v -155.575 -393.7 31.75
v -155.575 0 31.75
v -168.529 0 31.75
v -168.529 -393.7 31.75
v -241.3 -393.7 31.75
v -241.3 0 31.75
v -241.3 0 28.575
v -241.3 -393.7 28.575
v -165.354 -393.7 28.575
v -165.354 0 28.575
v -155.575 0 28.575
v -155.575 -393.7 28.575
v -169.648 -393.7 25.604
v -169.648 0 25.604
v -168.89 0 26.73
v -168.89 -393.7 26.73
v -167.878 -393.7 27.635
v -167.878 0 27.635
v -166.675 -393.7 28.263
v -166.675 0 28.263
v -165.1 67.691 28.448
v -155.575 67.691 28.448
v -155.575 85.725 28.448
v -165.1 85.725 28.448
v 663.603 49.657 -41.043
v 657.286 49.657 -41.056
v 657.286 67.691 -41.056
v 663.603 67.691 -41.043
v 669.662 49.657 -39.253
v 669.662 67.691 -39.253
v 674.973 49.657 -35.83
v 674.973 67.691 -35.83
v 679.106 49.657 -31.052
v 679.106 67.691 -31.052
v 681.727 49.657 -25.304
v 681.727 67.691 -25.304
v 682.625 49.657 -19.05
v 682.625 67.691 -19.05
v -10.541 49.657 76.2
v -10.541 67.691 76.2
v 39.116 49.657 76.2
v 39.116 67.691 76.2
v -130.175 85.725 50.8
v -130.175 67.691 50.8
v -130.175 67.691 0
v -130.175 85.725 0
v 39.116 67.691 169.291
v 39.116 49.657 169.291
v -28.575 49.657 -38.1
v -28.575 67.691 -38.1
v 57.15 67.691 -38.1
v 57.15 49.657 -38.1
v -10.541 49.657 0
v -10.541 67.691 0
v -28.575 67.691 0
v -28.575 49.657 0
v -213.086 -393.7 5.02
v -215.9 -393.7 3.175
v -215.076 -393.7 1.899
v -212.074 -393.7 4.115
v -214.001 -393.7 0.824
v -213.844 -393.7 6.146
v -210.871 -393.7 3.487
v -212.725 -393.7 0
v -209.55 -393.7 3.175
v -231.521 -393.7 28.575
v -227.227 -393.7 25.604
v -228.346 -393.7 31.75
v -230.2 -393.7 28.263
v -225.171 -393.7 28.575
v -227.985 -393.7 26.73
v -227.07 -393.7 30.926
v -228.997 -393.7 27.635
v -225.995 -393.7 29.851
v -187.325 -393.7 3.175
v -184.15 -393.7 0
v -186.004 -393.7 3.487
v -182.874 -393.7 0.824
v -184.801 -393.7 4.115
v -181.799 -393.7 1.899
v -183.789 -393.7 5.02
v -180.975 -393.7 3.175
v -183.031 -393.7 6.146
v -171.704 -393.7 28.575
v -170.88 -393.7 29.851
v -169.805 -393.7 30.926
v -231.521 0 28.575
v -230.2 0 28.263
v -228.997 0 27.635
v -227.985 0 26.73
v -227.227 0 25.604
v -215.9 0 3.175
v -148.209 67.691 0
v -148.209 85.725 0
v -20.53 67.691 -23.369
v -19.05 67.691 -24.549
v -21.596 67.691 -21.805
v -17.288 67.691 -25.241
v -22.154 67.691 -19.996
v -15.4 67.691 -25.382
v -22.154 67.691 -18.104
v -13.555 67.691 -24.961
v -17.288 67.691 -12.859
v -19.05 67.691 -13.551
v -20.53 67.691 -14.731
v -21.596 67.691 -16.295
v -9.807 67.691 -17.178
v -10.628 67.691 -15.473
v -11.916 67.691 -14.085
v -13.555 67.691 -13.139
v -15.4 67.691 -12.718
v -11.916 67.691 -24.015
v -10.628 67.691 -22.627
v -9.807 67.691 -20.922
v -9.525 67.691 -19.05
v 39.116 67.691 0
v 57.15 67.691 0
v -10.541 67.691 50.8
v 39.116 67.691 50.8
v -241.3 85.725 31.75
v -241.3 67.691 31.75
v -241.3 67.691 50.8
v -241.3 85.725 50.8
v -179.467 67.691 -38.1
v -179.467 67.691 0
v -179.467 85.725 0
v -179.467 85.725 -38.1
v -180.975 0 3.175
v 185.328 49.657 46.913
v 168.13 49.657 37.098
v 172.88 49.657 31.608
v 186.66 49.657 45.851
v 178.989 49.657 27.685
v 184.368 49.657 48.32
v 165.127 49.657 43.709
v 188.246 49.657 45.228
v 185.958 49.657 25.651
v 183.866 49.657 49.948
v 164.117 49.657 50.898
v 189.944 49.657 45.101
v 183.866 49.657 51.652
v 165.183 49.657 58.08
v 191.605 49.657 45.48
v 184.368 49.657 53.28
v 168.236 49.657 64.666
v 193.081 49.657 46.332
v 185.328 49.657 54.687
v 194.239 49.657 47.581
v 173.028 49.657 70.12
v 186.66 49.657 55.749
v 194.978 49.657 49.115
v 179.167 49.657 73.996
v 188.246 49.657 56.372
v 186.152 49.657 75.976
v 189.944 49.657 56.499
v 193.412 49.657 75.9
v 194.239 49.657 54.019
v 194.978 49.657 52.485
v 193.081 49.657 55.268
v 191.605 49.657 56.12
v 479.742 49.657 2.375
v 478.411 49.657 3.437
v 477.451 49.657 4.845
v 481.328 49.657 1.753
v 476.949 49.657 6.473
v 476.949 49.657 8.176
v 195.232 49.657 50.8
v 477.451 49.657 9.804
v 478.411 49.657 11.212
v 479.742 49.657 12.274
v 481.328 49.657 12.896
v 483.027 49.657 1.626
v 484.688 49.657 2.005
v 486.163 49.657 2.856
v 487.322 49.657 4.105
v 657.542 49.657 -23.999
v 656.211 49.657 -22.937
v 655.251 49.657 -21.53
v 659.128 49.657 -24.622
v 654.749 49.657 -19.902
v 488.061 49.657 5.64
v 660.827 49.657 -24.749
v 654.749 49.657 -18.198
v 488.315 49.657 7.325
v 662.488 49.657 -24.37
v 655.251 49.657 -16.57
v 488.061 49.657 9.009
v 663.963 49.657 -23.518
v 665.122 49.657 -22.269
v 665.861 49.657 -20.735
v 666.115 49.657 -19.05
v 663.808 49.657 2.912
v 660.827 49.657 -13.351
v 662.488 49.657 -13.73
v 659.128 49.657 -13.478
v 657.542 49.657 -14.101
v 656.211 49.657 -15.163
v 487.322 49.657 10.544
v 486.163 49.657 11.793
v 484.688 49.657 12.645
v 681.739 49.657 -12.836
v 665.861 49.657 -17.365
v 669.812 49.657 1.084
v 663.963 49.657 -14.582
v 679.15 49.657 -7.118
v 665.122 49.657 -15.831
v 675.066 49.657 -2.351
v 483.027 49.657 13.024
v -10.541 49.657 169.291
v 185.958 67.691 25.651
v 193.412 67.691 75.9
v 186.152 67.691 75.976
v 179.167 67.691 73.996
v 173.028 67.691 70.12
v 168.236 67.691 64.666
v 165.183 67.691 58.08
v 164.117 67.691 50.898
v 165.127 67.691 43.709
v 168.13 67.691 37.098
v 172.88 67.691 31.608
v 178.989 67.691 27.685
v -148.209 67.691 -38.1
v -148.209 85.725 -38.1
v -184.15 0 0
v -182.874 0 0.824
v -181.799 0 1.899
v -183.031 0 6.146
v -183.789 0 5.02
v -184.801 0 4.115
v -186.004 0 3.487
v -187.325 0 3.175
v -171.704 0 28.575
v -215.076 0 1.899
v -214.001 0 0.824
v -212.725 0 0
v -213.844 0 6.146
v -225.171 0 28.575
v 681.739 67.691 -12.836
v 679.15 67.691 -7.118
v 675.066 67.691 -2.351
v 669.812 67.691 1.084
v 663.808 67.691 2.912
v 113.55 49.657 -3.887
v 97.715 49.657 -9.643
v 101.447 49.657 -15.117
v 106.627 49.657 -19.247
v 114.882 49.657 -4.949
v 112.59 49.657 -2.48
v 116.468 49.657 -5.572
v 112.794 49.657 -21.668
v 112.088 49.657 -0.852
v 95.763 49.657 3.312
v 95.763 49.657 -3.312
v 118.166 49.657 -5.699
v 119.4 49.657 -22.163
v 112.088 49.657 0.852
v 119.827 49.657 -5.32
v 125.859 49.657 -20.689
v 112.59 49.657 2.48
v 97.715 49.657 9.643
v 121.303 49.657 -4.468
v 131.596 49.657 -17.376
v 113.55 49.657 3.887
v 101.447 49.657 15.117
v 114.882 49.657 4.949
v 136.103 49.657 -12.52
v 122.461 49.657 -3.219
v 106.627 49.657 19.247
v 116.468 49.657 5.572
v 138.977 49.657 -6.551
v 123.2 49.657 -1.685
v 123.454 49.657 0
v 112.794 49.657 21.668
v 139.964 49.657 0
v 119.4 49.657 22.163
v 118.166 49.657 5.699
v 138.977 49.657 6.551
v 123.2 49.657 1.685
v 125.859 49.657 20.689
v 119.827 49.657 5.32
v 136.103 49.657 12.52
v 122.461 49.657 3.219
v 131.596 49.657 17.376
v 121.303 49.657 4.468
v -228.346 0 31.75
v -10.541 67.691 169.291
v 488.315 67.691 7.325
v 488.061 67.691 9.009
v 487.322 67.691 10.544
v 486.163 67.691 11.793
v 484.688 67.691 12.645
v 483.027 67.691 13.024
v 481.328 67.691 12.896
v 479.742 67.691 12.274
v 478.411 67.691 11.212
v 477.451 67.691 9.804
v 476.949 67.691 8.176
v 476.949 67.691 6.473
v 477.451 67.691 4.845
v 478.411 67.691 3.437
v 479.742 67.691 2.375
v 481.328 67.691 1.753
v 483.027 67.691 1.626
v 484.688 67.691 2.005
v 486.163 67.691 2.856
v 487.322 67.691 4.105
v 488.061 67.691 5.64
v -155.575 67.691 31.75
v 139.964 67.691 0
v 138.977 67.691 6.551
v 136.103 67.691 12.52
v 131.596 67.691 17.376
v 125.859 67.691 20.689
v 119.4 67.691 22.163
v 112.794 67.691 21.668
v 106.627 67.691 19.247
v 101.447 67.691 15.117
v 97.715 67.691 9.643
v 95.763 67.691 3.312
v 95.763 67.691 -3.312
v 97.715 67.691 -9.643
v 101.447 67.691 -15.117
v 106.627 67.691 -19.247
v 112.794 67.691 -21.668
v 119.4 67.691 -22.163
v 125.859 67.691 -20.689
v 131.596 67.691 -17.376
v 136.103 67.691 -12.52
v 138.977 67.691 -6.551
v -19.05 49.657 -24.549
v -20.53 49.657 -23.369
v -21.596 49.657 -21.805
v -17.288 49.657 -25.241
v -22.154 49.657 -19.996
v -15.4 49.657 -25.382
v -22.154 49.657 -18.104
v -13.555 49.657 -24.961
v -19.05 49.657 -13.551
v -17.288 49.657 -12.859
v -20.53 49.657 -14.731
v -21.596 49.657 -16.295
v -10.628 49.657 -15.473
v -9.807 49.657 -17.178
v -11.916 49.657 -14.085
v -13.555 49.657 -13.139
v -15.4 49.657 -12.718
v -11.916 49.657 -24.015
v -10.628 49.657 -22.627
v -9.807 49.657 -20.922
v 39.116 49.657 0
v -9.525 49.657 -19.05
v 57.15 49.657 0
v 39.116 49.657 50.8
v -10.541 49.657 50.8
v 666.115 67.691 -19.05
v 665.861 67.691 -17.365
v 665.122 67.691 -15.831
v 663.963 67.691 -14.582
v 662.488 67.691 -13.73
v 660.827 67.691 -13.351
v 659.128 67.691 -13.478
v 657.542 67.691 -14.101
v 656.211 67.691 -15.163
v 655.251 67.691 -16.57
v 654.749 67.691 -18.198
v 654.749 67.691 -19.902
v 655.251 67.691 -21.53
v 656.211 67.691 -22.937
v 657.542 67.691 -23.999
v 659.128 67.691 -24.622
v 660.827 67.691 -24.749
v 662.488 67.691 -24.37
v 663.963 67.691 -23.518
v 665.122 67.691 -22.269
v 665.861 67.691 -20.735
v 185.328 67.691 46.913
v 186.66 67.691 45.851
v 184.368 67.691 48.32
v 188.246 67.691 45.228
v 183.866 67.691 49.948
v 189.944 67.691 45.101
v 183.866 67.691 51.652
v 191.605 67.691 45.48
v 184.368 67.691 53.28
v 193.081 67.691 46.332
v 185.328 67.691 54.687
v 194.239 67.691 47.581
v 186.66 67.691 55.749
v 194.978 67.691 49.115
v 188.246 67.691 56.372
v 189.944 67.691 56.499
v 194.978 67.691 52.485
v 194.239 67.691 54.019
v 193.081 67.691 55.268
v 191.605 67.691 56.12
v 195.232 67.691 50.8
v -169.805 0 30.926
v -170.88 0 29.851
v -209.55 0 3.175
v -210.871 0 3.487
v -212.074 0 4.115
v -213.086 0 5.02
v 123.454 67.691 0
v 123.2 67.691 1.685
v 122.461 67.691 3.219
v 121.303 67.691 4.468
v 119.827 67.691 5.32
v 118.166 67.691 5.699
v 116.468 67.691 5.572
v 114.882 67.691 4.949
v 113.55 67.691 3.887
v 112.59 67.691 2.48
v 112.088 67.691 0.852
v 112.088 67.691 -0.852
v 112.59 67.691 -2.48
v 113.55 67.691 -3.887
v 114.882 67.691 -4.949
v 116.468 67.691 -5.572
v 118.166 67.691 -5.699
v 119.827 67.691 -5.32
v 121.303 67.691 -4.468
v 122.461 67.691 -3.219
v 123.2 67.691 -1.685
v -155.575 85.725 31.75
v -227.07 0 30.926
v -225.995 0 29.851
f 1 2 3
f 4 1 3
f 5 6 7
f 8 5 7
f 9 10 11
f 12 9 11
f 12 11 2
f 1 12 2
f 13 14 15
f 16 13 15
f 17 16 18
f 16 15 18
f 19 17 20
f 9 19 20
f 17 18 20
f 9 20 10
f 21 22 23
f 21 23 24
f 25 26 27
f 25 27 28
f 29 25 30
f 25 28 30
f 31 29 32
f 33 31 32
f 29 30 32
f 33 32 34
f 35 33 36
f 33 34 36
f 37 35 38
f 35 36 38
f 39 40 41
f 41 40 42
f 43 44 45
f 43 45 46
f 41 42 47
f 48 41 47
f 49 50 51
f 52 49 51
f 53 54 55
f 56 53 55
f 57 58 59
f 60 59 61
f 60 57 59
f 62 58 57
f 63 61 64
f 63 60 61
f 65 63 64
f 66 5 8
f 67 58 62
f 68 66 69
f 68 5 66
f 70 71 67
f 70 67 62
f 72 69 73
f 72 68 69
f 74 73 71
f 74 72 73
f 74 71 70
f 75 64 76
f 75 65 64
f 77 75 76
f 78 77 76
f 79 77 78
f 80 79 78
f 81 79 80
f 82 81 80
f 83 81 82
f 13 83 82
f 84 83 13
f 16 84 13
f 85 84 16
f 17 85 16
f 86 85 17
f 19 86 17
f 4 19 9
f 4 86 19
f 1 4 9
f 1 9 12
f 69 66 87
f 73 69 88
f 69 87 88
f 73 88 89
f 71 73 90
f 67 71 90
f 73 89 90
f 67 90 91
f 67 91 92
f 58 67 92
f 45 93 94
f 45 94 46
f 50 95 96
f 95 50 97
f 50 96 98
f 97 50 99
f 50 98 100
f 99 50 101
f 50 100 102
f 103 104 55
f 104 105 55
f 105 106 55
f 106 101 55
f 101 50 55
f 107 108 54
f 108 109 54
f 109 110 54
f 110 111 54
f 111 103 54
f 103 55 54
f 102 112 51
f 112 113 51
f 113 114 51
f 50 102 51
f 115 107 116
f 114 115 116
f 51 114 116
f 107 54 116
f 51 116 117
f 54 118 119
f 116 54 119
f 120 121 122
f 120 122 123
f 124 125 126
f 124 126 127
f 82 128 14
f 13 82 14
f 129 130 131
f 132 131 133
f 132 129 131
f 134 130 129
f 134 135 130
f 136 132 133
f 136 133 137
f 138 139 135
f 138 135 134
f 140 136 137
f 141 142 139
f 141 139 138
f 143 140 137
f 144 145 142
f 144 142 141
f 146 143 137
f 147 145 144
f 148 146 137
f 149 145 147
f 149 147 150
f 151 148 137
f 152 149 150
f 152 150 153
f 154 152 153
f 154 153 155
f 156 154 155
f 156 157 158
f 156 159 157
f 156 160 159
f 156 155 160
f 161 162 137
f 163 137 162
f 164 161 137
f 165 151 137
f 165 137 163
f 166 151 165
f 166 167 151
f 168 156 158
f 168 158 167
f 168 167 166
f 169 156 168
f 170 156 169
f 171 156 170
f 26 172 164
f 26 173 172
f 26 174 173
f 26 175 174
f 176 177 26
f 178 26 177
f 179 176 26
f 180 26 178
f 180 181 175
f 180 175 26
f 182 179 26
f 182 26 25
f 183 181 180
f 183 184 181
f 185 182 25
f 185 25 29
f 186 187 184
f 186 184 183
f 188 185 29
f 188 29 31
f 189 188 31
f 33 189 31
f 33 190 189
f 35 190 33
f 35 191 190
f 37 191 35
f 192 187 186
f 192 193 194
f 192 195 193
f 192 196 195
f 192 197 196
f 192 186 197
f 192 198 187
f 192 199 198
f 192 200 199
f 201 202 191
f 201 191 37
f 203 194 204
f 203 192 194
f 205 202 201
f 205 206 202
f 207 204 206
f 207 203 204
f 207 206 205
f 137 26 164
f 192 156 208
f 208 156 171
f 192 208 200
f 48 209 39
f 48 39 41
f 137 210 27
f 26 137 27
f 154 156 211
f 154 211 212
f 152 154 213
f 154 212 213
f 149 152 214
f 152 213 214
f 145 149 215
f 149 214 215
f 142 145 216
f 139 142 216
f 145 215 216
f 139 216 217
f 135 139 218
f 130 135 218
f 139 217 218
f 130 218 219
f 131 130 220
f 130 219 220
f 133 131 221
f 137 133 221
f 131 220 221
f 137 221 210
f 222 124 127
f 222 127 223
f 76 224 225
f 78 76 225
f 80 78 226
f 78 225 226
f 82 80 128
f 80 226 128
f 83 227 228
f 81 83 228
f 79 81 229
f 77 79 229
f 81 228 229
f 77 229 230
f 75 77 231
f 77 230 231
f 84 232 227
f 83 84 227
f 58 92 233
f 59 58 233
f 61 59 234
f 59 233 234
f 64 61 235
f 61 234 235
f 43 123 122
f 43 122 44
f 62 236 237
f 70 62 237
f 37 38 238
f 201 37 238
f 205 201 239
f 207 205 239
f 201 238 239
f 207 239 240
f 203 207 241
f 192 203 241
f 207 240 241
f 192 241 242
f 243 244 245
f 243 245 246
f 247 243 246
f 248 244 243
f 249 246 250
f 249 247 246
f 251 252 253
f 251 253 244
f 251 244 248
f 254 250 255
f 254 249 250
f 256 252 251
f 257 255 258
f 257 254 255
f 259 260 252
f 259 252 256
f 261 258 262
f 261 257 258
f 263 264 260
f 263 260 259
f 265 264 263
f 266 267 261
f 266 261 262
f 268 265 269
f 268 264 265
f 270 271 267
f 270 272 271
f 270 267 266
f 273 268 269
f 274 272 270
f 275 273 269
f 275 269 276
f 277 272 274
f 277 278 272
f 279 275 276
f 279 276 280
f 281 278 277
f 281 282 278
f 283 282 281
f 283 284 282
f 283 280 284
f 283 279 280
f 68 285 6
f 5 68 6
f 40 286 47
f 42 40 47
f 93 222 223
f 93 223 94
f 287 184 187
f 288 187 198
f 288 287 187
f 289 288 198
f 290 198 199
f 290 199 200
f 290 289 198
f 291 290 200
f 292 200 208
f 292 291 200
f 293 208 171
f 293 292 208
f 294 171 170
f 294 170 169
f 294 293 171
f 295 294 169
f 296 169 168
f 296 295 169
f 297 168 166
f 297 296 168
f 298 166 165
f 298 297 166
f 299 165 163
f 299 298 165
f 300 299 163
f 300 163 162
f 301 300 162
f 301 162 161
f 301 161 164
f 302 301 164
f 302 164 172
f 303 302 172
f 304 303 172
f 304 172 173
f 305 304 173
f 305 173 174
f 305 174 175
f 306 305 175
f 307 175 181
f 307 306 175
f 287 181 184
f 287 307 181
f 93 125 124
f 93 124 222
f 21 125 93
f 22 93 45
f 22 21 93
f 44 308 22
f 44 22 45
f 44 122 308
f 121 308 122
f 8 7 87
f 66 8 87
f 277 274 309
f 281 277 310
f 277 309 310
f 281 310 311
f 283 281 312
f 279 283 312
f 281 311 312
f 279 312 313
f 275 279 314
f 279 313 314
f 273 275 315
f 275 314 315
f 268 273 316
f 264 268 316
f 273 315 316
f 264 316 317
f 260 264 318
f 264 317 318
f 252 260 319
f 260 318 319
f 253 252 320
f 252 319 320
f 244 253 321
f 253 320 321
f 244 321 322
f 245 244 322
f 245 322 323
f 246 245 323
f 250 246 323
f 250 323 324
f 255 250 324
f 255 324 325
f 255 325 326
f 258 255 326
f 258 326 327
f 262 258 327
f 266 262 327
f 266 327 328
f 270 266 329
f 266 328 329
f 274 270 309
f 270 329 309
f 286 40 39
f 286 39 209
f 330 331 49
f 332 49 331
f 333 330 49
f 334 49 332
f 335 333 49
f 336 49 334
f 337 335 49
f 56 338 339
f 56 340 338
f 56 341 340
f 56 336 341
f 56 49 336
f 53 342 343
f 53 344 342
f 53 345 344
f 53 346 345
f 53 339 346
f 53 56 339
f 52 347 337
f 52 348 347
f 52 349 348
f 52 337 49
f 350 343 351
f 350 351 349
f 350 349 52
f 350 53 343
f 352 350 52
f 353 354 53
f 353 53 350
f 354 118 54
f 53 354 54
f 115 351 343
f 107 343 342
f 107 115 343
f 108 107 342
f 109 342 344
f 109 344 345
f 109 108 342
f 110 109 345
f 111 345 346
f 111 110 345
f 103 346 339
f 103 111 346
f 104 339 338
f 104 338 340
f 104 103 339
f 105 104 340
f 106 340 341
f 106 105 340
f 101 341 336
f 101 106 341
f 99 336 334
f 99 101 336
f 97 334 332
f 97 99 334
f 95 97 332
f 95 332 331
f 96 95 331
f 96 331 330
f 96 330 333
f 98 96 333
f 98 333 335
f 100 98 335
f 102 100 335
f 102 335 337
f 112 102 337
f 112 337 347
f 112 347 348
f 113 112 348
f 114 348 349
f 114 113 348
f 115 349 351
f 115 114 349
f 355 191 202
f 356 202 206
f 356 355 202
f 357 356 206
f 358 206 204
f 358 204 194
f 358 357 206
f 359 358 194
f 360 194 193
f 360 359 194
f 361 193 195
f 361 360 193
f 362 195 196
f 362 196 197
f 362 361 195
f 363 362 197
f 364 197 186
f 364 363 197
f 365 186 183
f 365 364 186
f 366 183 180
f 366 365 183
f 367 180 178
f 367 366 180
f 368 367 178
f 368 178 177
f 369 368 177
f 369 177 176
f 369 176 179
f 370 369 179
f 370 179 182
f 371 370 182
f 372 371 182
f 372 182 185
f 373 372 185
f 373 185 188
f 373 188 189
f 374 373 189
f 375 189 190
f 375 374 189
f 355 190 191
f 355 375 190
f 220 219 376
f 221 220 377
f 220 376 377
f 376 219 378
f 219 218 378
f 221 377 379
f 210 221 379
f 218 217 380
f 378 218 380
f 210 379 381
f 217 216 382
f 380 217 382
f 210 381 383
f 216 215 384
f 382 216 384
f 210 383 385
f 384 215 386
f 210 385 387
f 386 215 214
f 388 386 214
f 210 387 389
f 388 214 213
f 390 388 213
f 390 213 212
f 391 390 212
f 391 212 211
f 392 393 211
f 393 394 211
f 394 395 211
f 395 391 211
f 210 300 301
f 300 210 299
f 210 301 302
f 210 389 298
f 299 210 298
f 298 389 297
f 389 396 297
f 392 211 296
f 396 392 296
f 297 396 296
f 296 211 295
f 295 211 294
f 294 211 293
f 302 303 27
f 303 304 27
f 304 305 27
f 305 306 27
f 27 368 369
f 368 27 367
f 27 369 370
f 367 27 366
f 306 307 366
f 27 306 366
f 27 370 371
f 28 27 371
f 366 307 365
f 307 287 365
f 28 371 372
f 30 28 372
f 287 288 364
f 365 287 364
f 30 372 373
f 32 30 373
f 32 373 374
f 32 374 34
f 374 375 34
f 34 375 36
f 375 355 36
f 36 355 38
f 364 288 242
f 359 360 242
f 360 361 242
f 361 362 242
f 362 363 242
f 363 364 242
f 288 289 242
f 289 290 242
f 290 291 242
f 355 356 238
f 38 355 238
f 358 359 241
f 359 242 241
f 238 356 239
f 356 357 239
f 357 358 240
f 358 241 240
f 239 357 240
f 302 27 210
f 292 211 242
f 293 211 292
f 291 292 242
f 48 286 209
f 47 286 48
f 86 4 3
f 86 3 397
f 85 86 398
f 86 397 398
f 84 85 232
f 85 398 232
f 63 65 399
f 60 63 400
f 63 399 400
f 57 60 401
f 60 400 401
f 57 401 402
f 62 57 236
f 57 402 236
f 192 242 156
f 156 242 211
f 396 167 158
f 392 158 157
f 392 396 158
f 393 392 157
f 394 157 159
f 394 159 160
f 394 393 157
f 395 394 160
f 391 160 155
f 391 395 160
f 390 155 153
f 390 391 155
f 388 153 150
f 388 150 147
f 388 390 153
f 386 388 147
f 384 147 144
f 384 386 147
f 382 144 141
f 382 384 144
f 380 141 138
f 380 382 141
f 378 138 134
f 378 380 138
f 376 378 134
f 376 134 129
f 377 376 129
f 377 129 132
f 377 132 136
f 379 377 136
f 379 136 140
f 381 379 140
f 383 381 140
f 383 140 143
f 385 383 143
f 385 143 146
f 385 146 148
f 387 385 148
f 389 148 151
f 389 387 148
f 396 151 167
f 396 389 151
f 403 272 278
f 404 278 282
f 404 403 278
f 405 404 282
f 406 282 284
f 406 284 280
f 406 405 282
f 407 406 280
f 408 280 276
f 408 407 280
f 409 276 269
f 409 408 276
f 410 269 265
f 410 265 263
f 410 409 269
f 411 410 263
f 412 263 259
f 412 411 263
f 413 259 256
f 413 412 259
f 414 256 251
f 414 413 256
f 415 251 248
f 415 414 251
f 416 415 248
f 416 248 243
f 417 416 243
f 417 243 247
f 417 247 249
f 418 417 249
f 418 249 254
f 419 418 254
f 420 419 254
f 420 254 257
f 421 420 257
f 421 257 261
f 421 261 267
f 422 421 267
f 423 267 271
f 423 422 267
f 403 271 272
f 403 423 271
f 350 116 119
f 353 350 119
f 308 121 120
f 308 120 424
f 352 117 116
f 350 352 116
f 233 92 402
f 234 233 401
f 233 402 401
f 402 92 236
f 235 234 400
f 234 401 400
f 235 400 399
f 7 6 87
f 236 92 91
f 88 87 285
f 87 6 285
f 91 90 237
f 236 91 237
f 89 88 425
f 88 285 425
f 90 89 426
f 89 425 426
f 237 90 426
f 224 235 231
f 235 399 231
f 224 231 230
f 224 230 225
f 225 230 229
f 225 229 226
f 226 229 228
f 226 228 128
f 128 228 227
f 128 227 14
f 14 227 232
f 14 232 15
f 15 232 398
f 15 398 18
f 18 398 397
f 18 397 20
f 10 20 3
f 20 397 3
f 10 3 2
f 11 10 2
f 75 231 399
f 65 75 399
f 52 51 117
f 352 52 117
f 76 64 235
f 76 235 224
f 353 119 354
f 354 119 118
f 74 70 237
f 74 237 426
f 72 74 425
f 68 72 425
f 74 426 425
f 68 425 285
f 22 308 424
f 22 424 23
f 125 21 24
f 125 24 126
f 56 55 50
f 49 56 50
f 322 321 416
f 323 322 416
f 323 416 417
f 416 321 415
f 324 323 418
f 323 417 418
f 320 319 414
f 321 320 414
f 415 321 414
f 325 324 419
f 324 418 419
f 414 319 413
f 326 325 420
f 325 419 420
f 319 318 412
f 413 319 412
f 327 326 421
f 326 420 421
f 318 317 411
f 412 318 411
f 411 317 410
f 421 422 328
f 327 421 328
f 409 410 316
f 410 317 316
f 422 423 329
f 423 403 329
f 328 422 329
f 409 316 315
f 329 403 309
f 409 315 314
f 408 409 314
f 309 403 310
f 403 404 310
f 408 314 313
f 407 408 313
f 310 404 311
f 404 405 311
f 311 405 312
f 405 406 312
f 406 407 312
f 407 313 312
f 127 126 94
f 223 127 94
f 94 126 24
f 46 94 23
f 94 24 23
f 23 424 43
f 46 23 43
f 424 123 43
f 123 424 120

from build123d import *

# Parameters (mm, degrees)
F0_W          = 12.954
F0_H          = 85.725
F0_W_2        = 5.334
F0_H_2        = 9.525
F0_W_3        = 15.621
F0_W_4        = 28.575
F1_DEPTH      = 31.75
F3_DEPTH      = 85.726
F4_W          = 111.125
F4_H          = 18.034
F5_DEPTH      = 50.8
F5_DEPTH_BACK = 38.1
F7_DEPTH      = 18.034
F6_R          = 6.35
F8_DEPTH      = 18.034
F6_W          = 49.657
F6_H          = 93.091
F6_R_2        = 5.715
F6_R_3        = 22.225
F9_DEPTH      = 393.7


with BuildPart() as f1:
    # F0 (on Top) → F1 (new body)
    with BuildSketch(Plane.XY):
        with Locations((-234.823, 42.8625)):
            Rectangle(F0_W, F0_H)
        with Locations((-233.8705, 47.625)):
            Rectangle(F0_W_2, F0_H_2, mode=Mode.SUBTRACT)
        with Locations((-220.5355, 42.8625)):
            Rectangle(F0_W_3, F0_H)
        with Locations((-198.4375, 42.8625)):
            Rectangle(F0_W_4, F0_H)
        with Locations((-169.8625, 42.8625)):
            Rectangle(F0_W_4, F0_H)
        with Locations((-163.0045, 47.625)):
            Rectangle(F0_W_2, F0_H_2, mode=Mode.SUBTRACT)
    extrude(amount=F1_DEPTH)

    # F2 (on face) → F3 (intersect, through all)
    with BuildSketch(Plane.XZ):
        Polygon((-241.3, 31.75), (-241.3, 28.575), (-231.521, 28.575), (-228.346, 28.575), (-228.346, 31.75), align=None)
        with BuildLine():
            Line((-228.346, 31.75), (-228.346, 28.575))
            Line((-228.346, 28.575), (-225.171, 28.575))
            ThreePointArc((-225.171, 28.575), (-226.5041592272, 30.4168407728), (-228.346, 31.75))
        make_face()
        with BuildLine():
            Line((-227.2272822536, 25.603620589), (-215.9, 3.175))
            Line((-215.9, 3.175), (-212.725, 3.175))
            Line((-212.725, 3.175), (-209.55, 3.175))
            ThreePointArc((-209.55, 3.175), (-212.0744542312, 4.1150549462), (-213.8437177464, 6.146379411))
            Line((-213.8437177464, 6.146379411), (-225.171, 28.575))
            Line((-225.171, 28.575), (-228.346, 28.575))
            Line((-228.346, 28.575), (-231.521, 28.575))
            ThreePointArc((-231.521, 28.575), (-228.9965457688, 27.6349450538), (-227.2272822536, 25.603620589))
        make_face()
        Polygon((-209.55, 3.175), (-212.725, 3.175), (-212.725, 0), (-184.15, 0), (-184.15, 3.175), (-187.325, 3.175), align=None)
        with BuildLine():
            Line((-212.725, 3.175), (-215.9, 3.175))
            ThreePointArc((-215.9, 3.175), (-214.5668407728, 1.3331592272), (-212.725, 0))
            Line((-212.725, 0), (-212.725, 3.175))
        make_face()
        with BuildLine():
            Line((-184.15, 3.175), (-184.15, 0))
            ThreePointArc((-184.15, 0), (-182.3081592272, 1.3331592272), (-180.975, 3.175))
            Line((-180.975, 3.175), (-184.15, 3.175))
        make_face()
        with BuildLine():
            ThreePointArc((-183.0312822536, 6.146379411), (-184.8005457688, 4.1150549462), (-187.325, 3.175))
            Line((-187.325, 3.175), (-184.15, 3.175))
            Line((-184.15, 3.175), (-180.975, 3.175))
            Line((-180.975, 3.175), (-169.6477177464, 25.603620589))
            ThreePointArc((-169.6477177464, 25.603620589), (-167.8784542312, 27.6349450538), (-165.354, 28.575))
            Line((-165.354, 28.575), (-168.529, 28.575))
            Line((-168.529, 28.575), (-171.704, 28.575))
            Line((-171.704, 28.575), (-183.0312822536, 6.146379411))
        make_face()
        with BuildLine():
            Line((-168.529, 28.575), (-168.529, 31.75))
            ThreePointArc((-168.529, 31.75), (-170.3708407728, 30.4168407728), (-171.704, 28.575))
            Line((-171.704, 28.575), (-168.529, 28.575))
        make_face()
        Polygon((-155.575, 31.75), (-168.529, 31.75), (-168.529, 28.575), (-165.354, 28.575), (-155.575, 28.575), align=None)
    extrude(amount=-F3_DEPTH, mode=Mode.INTERSECT)

    # F4 (on Top) → F5 (join, two sides)
    with BuildSketch(Plane.XY) as f5_sk:
        with Locations((-185.7375, 76.708)):
            Rectangle(F4_W, F4_H)
    extrude(amount=F5_DEPTH)
    extrude(f5_sk.sketch, amount=-F5_DEPTH_BACK)

    # F6 (on face) → F7 (intersect)
    with BuildSketch(Plane.XZ.offset(-67.691)):
        Polygon((-241.3, 50.8), (-241.3, 31.75), (-228.346, 31.75), (-168.529, 31.75), (-155.575, 31.75), (-155.575, 28.575), (-155.575, 28.448), (-165.1, 28.448), (-179.4672913041, 0), (-179.4672913041, -38.1), (-148.209, -38.1), (-148.209, 0), (-130.175, 0), (-130.175, 50.8), align=None)
    extrude(amount=-F7_DEPTH, mode=Mode.INTERSECT)


with BuildPart() as f8:
    # F6 (on face) → F8 (new body)
    with BuildSketch(Plane.XZ.offset(-67.691)):
        Polygon((39.116, 50.8), (-10.541, 50.8), (-10.541, 0), (-28.575, 0), (-28.575, -38.1), (57.15, -38.1), (57.15, 0), (39.116, 0), align=None)
        with Locations((-15.875, -19.05)):
            Circle(F6_R, mode=Mode.SUBTRACT)
    extrude(amount=F8_DEPTH)


with BuildPart() as f8b:
    # F6 (on face) → F8, piece 2 (new body)
    with BuildSketch(Plane.XZ.offset(-67.691)):
        with Locations((14.2875, 122.7455)):
            Rectangle(F6_W, F6_H)
    extrude(amount=F8_DEPTH)


with BuildPart() as f8c:
    # F6 (on face) → F8, piece 3 (new body)
    with BuildSketch(Plane.XZ.offset(-67.691)):
        with BuildLine():
            ThreePointArc((214.9172682286, 50.8), (208.8056128627, 67.3263353856), (193.4117752147, 75.8996576737))
            ThreePointArc((193.4117752147, 75.8996576737), (164.3921937427, 54.5270138283), (185.9579133544, 25.6506263919))
            ThreePointArc((185.9579133544, 25.6506263919), (206.1718829974, 31.6223096567), (214.9172682286, 50.8))
        make_face()
        with Locations((189.5172682286, 50.8)):
            Circle(F6_R_2, mode=Mode.SUBTRACT)
        with BuildLine():
            ThreePointArc((657.285564485, -41.0557019071), (638.4155598248, -15.7888629002), (663.8076936128, 2.9122004645))
            Line((663.8076936128, 2.9122004645), (193.4117752147, 75.8996576737))
            ThreePointArc((193.4117752147, 75.8996576737), (208.8056128627, 67.3263353856), (214.9172682286, 50.8))
            ThreePointArc((214.9172682286, 50.8), (206.1718829974, 31.6223096567), (185.9579133544, 25.6506263919))
            Line((185.9579133544, 25.6506263919), (657.285564485, -41.0557019071))
        make_face()
        with Locations((482.6, 7.3245709113)):
            Circle(F6_R_2, mode=Mode.SUBTRACT)
        with BuildLine():
            ThreePointArc((657.285564485, -41.0557019071), (674.9727879227, -35.8304790504), (682.625, -19.05))
            ThreePointArc((682.625, -19.05), (677.2773015548, -4.5894565376), (663.8076936128, 2.9122004645))
            ThreePointArc((663.8076936128, 2.9122004645), (638.4155598248, -15.7888629002), (657.285564485, -41.0557019071))
        make_face()
        with Locations((660.4, -19.05)):
            Circle(F6_R_2, mode=Mode.SUBTRACT)
    extrude(amount=F8_DEPTH)


with BuildPart() as f8d:
    # F6 (on face) → F8, piece 4 (new body)
    with BuildSketch(Plane.XZ.offset(-67.691)):
        with Locations((117.7393719554, 0)):
            Circle(F6_R_3)
        with Locations((117.7393719554, 0)):
            Circle(F6_R_2, mode=Mode.SUBTRACT)
    extrude(amount=F8_DEPTH)


with BuildPart() as f9:
    # F2 (on face) → F9 (new body)
    with BuildSketch(Plane.XZ):
        Polygon((-155.575, 31.75), (-168.529, 31.75), (-168.529, 28.575), (-165.354, 28.575), (-155.575, 28.575), align=None)
        with BuildLine():
            Line((-168.529, 28.575), (-168.529, 31.75))
            ThreePointArc((-168.529, 31.75), (-170.3708407728, 30.4168407728), (-171.704, 28.575))
            Line((-171.704, 28.575), (-168.529, 28.575))
        make_face()
        with BuildLine():
            ThreePointArc((-183.0312822536, 6.146379411), (-184.8005457688, 4.1150549462), (-187.325, 3.175))
            Line((-187.325, 3.175), (-184.15, 3.175))
            Line((-184.15, 3.175), (-180.975, 3.175))
            Line((-180.975, 3.175), (-169.6477177464, 25.603620589))
            ThreePointArc((-169.6477177464, 25.603620589), (-167.8784542312, 27.6349450538), (-165.354, 28.575))
            Line((-165.354, 28.575), (-168.529, 28.575))
            Line((-168.529, 28.575), (-171.704, 28.575))
            Line((-171.704, 28.575), (-183.0312822536, 6.146379411))
        make_face()
        Polygon((-241.3, 31.75), (-241.3, 28.575), (-231.521, 28.575), (-228.346, 28.575), (-228.346, 31.75), align=None)
        with BuildLine():
            Line((-228.346, 31.75), (-228.346, 28.575))
            Line((-228.346, 28.575), (-225.171, 28.575))
            ThreePointArc((-225.171, 28.575), (-226.5041592272, 30.4168407728), (-228.346, 31.75))
        make_face()
        Polygon((-209.55, 3.175), (-212.725, 3.175), (-212.725, 0), (-184.15, 0), (-184.15, 3.175), (-187.325, 3.175), align=None)
        with BuildLine():
            Line((-184.15, 3.175), (-184.15, 0))
            ThreePointArc((-184.15, 0), (-182.3081592272, 1.3331592272), (-180.975, 3.175))
            Line((-180.975, 3.175), (-184.15, 3.175))
        make_face()
        with BuildLine():
            Line((-212.725, 3.175), (-215.9, 3.175))
            ThreePointArc((-215.9, 3.175), (-214.5668407728, 1.3331592272), (-212.725, 0))
            Line((-212.725, 0), (-212.725, 3.175))
        make_face()
        with BuildLine():
            Line((-227.2272822536, 25.603620589), (-215.9, 3.175))
            Line((-215.9, 3.175), (-212.725, 3.175))
            Line((-212.725, 3.175), (-209.55, 3.175))
            ThreePointArc((-209.55, 3.175), (-212.0744542312, 4.1150549462), (-213.8437177464, 6.146379411))
            Line((-213.8437177464, 6.146379411), (-225.171, 28.575))
            Line((-225.171, 28.575), (-228.346, 28.575))
            Line((-228.346, 28.575), (-231.521, 28.575))
            ThreePointArc((-231.521, 28.575), (-228.9965457688, 27.6349450538), (-227.2272822536, 25.603620589))
        make_face()
    extrude(amount=F9_DEPTH)


solid = Compound([f1.part, f8.part, f8b.part, f8c.part, f8d.part, f9.part])
